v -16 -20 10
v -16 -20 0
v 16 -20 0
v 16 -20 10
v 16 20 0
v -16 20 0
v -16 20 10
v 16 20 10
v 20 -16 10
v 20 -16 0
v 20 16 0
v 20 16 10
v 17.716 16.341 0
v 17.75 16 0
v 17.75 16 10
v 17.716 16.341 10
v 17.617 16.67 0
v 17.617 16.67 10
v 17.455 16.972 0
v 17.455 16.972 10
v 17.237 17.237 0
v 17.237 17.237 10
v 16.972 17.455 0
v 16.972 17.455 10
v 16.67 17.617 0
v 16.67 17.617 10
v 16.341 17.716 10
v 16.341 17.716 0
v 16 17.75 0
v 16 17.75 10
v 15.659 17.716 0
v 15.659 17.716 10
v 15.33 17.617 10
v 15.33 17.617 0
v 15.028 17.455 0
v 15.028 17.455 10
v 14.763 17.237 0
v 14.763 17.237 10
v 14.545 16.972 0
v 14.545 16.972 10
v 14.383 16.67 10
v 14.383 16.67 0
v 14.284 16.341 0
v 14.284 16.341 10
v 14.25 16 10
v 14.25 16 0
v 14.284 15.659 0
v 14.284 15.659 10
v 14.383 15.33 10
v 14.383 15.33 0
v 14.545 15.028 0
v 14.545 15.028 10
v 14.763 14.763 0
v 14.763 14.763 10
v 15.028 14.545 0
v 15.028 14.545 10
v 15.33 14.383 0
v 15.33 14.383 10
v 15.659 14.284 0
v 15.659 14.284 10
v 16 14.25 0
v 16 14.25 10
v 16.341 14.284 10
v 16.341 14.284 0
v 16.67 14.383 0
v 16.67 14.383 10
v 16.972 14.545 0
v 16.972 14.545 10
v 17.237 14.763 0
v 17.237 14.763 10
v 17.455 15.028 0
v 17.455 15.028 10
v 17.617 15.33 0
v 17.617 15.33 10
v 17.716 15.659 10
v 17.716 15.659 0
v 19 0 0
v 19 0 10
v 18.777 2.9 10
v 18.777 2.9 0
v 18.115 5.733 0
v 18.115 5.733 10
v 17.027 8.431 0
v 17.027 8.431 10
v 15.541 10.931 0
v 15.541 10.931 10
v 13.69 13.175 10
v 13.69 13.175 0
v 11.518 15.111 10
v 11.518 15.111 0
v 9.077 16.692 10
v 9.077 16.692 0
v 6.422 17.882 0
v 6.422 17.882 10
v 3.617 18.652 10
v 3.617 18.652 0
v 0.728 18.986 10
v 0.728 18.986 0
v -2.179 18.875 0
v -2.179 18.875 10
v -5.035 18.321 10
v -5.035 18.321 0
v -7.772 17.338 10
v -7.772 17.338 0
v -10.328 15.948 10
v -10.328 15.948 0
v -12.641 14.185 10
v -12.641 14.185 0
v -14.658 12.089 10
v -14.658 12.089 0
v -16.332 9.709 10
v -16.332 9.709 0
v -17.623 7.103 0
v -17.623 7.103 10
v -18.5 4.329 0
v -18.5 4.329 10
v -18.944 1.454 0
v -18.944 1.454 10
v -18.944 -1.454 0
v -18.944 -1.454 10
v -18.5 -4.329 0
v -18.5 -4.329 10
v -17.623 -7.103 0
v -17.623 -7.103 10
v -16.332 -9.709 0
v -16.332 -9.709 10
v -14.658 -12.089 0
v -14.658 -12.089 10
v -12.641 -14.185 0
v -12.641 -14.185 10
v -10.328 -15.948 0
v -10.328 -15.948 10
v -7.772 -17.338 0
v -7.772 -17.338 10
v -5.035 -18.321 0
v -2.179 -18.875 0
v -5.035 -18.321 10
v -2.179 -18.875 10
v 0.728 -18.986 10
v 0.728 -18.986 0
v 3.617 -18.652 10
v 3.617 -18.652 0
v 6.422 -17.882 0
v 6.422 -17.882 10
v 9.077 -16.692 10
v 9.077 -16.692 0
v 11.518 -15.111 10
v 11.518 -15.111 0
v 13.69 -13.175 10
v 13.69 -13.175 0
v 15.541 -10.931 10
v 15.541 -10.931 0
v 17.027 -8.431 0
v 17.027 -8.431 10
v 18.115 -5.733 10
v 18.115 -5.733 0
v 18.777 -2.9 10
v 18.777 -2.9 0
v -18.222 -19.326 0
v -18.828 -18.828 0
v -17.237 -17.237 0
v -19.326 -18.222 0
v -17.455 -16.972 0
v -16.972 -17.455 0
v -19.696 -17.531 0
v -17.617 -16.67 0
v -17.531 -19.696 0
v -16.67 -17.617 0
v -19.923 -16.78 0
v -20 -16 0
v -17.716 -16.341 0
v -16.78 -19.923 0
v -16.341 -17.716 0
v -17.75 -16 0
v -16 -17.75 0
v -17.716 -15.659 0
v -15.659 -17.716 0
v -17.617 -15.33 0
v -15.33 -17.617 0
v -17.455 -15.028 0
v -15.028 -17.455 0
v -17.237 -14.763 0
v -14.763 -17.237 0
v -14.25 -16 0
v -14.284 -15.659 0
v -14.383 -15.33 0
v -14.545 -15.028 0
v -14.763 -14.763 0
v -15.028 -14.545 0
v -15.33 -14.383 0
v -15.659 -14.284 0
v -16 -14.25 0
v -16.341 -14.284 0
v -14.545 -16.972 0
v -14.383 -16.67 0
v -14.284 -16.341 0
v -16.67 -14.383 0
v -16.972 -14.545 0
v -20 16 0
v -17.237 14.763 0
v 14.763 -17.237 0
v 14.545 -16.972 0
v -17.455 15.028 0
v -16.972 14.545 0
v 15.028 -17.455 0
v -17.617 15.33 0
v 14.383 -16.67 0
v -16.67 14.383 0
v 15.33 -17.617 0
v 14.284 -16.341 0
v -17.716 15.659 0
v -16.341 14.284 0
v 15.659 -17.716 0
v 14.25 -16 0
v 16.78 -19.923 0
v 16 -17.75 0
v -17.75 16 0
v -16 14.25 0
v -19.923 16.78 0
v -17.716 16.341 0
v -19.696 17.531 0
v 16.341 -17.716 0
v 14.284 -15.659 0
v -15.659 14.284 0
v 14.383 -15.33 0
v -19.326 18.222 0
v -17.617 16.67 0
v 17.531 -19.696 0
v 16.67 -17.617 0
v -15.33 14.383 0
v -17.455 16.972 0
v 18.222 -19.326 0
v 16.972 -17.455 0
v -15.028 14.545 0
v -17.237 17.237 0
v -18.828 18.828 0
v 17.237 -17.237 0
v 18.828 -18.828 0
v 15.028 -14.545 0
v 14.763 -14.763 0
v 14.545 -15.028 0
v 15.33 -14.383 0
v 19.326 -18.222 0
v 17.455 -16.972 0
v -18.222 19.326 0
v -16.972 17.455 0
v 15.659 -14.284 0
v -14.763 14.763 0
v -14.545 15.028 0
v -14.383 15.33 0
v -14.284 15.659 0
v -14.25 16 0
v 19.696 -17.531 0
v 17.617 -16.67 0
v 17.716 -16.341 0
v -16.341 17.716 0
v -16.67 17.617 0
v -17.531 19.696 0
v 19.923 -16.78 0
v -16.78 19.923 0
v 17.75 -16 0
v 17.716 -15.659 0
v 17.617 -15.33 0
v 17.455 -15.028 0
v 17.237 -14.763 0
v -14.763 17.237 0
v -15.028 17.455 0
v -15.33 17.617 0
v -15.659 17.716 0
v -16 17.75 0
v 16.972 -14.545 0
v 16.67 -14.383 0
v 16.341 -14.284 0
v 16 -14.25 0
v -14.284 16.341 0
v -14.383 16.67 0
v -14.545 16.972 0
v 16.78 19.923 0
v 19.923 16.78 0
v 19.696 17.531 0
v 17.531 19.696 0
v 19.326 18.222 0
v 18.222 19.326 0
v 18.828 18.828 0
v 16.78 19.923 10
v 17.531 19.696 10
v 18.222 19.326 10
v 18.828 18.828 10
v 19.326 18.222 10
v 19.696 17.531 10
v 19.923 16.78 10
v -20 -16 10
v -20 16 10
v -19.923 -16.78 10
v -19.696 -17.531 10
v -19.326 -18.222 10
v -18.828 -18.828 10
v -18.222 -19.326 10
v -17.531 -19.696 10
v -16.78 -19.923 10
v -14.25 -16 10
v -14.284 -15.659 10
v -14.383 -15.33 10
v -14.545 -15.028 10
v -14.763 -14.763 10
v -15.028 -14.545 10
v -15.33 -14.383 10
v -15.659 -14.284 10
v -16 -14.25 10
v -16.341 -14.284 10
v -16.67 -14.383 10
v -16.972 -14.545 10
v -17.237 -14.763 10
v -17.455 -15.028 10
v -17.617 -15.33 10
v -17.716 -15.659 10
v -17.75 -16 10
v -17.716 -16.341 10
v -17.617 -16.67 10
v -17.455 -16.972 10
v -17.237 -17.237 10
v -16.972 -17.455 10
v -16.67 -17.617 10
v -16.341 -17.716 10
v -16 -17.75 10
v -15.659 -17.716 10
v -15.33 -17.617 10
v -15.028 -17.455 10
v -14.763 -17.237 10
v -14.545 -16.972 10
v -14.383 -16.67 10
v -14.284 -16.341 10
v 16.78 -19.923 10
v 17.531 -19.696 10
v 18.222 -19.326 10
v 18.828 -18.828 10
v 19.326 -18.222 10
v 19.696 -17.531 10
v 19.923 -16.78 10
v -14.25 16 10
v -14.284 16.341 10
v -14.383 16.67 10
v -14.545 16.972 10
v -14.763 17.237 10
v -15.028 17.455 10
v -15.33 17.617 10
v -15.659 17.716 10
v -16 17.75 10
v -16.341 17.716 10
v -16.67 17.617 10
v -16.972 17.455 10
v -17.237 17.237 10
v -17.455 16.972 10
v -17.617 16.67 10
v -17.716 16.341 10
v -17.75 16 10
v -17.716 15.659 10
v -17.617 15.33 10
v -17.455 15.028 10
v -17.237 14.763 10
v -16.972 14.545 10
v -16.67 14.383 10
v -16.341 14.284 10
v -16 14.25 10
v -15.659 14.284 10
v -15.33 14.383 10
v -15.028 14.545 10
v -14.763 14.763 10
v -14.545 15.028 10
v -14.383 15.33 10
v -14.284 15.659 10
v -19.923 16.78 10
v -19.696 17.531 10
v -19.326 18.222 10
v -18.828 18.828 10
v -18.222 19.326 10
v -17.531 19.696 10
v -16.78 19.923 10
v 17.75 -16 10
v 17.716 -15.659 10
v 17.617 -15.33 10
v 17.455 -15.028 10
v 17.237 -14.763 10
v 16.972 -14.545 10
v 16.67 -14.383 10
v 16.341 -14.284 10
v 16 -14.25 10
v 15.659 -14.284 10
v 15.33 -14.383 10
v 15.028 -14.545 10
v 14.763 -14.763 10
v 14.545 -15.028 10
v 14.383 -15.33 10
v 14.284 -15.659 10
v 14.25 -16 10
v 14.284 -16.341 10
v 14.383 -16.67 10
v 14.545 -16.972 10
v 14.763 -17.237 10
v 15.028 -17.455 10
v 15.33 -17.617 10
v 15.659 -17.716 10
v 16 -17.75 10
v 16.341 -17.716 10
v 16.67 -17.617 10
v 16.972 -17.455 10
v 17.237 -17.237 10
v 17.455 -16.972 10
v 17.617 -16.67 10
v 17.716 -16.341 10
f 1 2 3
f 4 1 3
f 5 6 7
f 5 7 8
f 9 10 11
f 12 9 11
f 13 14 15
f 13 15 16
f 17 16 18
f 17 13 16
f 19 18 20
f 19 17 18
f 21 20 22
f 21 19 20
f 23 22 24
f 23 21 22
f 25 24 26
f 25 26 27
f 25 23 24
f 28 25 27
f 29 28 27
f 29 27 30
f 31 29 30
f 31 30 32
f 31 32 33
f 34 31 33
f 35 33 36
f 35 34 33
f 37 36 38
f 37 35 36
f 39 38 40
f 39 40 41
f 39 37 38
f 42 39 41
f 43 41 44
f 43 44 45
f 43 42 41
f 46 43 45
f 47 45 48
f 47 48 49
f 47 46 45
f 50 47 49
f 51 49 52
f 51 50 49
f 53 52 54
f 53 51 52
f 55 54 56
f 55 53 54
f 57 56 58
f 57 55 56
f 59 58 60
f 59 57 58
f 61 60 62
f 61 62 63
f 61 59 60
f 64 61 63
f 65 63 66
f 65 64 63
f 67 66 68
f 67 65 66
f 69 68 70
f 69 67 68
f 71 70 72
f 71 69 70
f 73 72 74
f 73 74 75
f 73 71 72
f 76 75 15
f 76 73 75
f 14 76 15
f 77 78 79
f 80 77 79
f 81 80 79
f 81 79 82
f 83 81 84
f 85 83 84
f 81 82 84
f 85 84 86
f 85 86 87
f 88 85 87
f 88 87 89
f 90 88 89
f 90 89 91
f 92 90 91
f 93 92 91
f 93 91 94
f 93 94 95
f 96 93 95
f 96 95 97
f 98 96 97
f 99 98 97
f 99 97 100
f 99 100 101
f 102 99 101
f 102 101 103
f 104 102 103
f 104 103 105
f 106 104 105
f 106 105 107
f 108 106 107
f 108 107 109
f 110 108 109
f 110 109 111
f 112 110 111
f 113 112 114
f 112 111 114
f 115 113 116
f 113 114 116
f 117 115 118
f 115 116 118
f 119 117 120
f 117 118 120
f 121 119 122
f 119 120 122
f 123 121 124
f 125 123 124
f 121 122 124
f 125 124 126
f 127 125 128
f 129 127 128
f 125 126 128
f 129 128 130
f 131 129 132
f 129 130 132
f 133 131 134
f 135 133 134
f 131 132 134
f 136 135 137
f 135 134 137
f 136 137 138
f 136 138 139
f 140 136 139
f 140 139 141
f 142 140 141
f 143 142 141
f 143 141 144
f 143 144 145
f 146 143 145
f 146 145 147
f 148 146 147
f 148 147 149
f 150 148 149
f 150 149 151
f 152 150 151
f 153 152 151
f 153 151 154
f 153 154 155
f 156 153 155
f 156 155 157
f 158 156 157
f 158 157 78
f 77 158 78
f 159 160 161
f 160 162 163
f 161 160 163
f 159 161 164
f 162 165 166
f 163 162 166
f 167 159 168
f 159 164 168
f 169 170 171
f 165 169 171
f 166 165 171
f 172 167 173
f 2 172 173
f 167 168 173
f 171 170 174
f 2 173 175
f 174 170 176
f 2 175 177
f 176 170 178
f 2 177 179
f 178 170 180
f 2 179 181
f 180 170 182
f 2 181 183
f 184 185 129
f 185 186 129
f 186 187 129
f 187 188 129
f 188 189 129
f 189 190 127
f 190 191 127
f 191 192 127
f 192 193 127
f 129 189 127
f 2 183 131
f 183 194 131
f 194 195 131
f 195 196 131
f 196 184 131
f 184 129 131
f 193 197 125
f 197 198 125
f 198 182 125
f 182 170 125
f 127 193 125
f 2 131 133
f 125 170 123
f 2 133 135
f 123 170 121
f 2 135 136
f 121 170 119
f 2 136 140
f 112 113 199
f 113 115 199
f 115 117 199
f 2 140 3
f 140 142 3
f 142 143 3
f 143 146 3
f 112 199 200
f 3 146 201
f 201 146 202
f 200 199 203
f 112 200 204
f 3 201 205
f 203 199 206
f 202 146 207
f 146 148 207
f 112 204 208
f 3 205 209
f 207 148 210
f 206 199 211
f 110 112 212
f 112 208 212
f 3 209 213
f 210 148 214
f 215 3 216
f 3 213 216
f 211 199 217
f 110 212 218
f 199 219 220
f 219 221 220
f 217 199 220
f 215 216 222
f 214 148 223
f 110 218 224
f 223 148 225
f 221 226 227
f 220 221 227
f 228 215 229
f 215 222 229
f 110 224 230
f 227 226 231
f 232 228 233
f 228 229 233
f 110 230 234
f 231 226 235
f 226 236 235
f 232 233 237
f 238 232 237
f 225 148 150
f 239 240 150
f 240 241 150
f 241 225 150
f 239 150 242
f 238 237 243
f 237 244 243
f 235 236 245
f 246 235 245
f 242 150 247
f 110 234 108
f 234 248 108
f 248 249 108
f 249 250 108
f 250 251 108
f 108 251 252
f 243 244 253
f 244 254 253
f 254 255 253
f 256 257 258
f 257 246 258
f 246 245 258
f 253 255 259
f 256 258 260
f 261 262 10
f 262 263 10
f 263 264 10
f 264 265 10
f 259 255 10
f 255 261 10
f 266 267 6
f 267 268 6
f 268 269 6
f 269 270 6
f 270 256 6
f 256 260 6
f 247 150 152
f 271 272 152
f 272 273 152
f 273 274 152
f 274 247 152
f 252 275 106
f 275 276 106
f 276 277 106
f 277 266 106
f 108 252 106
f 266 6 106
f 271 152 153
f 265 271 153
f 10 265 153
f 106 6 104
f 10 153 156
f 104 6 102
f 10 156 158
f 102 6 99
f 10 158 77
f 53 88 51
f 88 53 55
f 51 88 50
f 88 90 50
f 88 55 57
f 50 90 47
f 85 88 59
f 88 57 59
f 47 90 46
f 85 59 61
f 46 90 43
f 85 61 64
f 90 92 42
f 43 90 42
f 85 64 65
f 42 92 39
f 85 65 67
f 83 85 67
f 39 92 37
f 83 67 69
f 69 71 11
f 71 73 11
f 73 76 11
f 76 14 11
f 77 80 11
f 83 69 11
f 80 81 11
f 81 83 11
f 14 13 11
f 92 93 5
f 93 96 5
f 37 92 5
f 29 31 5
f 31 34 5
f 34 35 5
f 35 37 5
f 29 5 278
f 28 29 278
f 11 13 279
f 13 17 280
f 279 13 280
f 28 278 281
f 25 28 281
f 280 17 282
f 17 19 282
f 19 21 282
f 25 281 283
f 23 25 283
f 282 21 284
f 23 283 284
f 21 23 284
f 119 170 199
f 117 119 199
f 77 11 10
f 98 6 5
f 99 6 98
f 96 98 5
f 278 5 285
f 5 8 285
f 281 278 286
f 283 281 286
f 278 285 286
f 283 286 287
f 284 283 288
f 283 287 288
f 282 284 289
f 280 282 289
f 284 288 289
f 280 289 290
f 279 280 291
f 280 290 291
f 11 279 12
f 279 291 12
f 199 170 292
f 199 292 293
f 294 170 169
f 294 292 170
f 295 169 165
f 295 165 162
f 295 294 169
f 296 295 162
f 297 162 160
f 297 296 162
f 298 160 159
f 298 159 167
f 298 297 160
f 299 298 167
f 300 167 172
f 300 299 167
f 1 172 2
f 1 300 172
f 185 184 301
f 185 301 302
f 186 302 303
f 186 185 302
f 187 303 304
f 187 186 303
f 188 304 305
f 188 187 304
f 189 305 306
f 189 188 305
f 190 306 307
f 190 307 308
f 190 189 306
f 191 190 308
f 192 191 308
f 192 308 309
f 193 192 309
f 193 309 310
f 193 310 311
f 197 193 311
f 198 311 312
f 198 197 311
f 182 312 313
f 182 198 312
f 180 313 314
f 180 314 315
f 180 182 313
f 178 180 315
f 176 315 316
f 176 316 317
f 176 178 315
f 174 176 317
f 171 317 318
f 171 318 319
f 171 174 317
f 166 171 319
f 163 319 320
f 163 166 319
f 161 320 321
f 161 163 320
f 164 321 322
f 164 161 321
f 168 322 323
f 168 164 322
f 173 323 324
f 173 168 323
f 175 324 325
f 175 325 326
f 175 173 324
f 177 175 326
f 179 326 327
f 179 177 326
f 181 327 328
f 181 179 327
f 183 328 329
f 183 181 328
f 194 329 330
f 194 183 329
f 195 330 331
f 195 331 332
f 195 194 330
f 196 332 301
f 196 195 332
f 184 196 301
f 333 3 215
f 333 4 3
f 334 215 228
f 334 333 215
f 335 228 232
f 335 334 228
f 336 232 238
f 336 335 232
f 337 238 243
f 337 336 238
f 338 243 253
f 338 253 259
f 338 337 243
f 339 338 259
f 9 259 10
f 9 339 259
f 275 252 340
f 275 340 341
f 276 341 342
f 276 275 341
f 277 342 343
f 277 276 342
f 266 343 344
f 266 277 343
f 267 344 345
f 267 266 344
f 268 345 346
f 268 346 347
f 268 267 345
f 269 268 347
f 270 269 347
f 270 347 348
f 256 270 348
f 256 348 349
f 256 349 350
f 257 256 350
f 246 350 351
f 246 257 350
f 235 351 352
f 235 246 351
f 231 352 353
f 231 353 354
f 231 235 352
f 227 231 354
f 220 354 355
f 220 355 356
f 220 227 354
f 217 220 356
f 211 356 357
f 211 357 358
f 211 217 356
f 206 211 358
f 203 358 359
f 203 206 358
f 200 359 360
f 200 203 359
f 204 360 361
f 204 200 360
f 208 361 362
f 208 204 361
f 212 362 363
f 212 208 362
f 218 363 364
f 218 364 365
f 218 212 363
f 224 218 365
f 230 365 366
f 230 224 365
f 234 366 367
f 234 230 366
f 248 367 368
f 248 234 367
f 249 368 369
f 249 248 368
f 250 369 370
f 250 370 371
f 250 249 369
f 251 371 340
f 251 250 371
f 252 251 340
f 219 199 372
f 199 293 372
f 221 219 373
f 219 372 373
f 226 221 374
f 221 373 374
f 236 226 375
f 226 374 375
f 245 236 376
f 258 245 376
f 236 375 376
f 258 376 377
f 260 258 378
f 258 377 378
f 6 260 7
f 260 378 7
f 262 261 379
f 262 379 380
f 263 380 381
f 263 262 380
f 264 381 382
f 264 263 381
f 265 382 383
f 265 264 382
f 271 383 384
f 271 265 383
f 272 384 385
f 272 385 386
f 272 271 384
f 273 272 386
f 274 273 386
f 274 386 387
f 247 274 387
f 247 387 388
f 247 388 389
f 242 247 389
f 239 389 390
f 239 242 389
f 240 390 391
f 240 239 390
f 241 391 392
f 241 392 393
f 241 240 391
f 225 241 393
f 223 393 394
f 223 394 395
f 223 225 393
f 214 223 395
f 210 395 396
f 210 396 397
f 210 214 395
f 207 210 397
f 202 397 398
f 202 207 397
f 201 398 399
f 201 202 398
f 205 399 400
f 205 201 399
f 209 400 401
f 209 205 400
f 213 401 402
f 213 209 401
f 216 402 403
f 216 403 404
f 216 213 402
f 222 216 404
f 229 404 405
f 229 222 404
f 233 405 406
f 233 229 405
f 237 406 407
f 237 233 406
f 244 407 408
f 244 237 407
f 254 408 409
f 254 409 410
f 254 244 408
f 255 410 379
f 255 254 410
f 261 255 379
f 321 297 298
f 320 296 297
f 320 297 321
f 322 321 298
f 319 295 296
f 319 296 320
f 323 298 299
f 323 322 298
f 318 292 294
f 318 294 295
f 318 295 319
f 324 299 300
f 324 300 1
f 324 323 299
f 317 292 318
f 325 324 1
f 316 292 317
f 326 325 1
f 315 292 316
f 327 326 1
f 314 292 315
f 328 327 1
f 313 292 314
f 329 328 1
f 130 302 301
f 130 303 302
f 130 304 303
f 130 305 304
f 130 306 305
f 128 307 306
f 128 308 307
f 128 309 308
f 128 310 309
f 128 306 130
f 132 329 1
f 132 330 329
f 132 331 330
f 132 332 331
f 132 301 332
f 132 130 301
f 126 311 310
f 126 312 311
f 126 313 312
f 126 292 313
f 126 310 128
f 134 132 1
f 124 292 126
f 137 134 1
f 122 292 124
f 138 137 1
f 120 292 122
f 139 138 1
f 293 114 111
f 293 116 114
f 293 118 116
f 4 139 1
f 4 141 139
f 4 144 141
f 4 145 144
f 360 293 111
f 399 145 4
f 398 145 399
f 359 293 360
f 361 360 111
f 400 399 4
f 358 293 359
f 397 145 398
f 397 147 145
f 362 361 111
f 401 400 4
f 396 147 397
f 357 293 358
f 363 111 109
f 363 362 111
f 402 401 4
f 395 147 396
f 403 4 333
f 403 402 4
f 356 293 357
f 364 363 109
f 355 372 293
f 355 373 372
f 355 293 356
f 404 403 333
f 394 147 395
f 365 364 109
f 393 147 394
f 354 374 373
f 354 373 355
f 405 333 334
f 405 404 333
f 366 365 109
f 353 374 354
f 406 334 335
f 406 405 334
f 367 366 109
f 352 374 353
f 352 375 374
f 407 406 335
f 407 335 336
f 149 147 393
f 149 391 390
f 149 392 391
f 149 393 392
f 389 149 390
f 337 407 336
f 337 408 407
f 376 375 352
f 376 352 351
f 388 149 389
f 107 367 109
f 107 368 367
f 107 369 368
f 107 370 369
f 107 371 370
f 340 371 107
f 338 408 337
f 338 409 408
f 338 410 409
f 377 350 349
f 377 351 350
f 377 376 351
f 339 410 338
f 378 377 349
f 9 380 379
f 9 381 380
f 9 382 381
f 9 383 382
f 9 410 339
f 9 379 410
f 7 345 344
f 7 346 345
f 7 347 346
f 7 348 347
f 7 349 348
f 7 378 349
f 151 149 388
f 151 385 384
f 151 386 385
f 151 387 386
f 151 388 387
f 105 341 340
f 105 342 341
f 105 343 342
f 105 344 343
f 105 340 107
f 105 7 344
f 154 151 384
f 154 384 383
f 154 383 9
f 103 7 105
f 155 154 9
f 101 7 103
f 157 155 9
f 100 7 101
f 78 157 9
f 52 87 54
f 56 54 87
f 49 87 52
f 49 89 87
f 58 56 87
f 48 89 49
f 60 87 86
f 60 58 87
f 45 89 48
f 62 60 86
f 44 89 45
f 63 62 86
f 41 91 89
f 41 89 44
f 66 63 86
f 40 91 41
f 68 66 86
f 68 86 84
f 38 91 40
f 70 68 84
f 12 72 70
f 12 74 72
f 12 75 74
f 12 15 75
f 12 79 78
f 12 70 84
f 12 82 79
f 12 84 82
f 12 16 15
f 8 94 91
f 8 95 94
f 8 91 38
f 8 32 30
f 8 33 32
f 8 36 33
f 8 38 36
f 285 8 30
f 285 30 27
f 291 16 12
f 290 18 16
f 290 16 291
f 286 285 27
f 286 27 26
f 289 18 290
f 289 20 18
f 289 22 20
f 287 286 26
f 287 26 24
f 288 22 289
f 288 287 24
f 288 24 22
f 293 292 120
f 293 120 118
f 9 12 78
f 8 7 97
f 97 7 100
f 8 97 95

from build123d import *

# Parameters (mm, degrees)
SKETCH_W     = 40
SKETCH_H     = 40
SKETCH_R     = 1.75
PAD_DEPTH    = 10
FILLET_R     = 4
SKETCH001_R  = 19
POCKET_DEPTH = 10.001


with BuildPart() as part:
    # Sketch → Pad (new body)
    with BuildSketch(Plane.XY):
        Rectangle(SKETCH_W, SKETCH_H)
        with Locations((-16, 16)):
            Circle(SKETCH_R, mode=Mode.SUBTRACT)
        with Locations((16, 16)):
            Circle(SKETCH_R, mode=Mode.SUBTRACT)
        with Locations((16, -16)):
            Circle(SKETCH_R, mode=Mode.SUBTRACT)
        with Locations((-16, -16)):
            Circle(SKETCH_R, mode=Mode.SUBTRACT)
    extrude(amount=PAD_DEPTH)

    # Fillet
    fillet_edges = [part.edges().sort_by_distance(p)[0] for p in [
        (20, -20, 5),
        (-20, -20, 5),
        (20, 20, 5),
        (-20, 20, 5),
    ]]
    fillet(fillet_edges, radius=FILLET_R)

    # Sketch001 (on Face5 of Fillet) → Pocket (cut, through all)
    with BuildSketch(Plane.XY.offset(10)):
        Circle(SKETCH001_R)
    extrude(amount=-POCKET_DEPTH, mode=Mode.SUBTRACT)


solid = part.part
